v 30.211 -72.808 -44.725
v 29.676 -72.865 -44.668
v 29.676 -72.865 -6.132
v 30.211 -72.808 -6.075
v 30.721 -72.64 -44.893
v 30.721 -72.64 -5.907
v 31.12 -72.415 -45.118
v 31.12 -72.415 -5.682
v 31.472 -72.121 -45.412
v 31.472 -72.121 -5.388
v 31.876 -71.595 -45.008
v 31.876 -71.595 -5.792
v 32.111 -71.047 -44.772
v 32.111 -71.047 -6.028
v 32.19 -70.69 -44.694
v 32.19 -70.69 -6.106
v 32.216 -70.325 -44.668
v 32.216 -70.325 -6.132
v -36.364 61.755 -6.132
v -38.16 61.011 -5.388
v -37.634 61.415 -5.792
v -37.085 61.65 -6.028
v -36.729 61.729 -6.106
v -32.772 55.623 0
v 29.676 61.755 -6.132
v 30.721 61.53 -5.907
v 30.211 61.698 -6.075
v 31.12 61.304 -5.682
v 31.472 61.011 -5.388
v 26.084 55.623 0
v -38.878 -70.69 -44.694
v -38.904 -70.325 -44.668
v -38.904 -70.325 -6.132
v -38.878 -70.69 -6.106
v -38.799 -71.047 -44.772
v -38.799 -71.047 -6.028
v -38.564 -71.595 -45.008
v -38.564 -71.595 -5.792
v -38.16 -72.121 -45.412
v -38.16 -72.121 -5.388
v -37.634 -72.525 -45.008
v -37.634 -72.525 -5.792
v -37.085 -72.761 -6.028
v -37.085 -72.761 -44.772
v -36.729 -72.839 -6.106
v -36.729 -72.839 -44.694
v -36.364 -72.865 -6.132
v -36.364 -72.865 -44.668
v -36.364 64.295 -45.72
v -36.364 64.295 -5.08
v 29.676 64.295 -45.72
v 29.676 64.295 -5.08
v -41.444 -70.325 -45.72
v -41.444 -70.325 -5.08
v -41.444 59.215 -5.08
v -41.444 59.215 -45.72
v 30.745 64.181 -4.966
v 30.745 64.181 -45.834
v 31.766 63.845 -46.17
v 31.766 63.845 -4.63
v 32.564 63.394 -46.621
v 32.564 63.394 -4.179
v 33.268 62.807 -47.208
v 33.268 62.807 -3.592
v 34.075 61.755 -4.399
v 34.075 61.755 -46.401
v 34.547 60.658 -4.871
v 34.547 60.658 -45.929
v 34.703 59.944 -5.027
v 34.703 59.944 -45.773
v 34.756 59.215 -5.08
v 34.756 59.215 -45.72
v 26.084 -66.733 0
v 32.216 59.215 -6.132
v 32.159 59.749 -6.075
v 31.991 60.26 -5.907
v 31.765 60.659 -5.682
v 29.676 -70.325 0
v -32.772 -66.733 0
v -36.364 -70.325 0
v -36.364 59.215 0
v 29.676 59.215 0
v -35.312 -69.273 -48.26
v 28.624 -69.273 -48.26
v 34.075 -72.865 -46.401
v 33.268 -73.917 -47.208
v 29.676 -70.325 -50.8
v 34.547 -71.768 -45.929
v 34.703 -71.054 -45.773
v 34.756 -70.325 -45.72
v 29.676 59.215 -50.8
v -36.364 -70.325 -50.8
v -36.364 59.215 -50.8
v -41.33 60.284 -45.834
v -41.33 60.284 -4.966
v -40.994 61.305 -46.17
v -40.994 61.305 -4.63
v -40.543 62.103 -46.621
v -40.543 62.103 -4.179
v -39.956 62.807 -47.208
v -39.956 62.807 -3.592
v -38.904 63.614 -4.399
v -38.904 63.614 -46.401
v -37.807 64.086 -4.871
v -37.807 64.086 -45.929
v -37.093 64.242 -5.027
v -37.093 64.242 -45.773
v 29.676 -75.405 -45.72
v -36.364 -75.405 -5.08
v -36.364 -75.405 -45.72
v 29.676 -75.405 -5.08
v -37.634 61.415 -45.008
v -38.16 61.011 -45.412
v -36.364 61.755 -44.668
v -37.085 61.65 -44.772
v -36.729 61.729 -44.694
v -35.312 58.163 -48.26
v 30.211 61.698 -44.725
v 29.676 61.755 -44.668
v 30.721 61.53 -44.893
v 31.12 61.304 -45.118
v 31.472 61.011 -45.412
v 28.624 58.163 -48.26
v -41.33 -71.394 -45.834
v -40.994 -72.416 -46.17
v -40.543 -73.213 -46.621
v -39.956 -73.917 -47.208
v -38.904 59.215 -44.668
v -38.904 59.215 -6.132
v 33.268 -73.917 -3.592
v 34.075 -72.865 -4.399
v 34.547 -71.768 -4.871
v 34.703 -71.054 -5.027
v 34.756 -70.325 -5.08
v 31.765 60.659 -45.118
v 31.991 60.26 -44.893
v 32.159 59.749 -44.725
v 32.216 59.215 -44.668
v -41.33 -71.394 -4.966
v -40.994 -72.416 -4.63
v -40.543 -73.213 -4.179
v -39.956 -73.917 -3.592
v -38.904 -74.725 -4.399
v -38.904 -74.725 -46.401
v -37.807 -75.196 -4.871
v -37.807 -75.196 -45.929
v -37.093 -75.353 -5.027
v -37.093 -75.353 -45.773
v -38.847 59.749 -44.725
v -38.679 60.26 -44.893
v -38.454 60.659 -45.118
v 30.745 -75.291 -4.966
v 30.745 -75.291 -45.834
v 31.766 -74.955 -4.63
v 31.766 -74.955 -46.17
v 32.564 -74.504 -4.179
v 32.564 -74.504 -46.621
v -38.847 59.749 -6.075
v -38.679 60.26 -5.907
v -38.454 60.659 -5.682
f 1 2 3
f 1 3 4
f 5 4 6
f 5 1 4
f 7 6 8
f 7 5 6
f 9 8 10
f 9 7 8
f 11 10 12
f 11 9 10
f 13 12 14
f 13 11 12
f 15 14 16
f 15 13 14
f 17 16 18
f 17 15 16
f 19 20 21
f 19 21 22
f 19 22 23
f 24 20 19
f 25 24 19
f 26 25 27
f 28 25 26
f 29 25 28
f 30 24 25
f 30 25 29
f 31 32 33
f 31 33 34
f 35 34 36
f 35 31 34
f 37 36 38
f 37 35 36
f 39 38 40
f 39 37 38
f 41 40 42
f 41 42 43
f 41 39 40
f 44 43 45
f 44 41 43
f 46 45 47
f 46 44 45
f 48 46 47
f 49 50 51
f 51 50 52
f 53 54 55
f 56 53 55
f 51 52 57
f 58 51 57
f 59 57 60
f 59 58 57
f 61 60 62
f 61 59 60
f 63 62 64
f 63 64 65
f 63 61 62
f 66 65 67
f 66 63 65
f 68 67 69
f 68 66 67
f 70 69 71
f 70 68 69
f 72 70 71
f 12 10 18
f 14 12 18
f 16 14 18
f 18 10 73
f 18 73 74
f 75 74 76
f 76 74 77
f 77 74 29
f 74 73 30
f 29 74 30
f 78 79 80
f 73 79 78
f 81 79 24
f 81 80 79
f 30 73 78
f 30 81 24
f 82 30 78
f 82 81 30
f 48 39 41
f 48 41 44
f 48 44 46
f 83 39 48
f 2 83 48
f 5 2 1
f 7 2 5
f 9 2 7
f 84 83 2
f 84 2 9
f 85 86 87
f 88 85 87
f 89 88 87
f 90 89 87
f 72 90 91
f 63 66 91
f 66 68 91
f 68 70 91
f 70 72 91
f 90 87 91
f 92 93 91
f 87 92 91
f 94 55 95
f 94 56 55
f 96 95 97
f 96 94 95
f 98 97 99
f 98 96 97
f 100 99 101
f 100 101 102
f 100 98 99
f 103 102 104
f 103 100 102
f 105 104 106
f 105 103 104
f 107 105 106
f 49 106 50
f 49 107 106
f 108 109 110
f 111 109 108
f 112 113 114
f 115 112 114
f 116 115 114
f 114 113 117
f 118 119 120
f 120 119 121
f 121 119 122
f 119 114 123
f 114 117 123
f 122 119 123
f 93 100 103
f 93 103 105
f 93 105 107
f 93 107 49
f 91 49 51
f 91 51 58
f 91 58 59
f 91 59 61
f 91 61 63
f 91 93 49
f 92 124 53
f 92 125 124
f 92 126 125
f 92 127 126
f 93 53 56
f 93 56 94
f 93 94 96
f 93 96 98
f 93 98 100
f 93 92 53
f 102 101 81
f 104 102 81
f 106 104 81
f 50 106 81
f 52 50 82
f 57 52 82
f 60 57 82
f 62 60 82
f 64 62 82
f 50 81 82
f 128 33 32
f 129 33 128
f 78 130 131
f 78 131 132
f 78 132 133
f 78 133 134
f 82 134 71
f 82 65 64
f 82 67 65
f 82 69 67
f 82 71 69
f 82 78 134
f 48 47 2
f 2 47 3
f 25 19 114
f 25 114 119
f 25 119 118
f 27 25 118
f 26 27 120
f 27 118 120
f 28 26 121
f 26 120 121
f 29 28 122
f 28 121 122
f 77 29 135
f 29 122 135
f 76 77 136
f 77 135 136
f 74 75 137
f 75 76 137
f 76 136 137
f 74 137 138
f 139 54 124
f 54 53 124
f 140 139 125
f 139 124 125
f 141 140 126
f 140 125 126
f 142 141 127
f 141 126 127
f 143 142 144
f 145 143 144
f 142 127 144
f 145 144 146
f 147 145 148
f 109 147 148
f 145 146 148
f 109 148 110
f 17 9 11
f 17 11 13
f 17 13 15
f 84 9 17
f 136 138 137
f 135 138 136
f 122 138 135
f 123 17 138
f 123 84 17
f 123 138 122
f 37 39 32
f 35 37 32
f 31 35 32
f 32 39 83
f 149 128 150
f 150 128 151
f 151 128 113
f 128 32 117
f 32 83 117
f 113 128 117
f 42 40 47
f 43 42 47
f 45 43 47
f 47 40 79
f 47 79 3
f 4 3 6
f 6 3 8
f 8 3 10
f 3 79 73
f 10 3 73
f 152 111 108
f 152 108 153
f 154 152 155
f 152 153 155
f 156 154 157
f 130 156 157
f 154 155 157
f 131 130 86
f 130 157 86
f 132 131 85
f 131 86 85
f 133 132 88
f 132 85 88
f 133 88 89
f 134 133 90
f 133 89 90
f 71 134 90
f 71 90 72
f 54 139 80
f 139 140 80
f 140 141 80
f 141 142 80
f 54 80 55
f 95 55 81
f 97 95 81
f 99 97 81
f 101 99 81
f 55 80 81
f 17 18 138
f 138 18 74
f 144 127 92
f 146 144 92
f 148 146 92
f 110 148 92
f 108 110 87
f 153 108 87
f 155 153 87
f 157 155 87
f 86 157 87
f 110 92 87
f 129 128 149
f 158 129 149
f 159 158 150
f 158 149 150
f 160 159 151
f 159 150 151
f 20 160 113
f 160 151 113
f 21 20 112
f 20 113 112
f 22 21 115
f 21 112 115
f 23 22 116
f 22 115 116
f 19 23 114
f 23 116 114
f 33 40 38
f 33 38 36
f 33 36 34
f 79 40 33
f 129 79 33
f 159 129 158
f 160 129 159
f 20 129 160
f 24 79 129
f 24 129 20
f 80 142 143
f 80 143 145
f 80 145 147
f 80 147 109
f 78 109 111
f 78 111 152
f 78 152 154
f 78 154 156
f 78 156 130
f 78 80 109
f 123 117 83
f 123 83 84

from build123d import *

# Parameters (mm, degrees)
F0_W     = 76.2
F0_H     = 139.7
F1_DEPTH = 50.8
F2_SIZE  = 5.08
F3_R     = 5.08
F4_T     = -2.54


with BuildPart() as f1:
    # F0 (on Top) → F1 (new body)
    with BuildSketch(Plane.XY):
        with Locations((-3.34403, -5.555106)):
            Rectangle(F0_W, F0_H)
    extrude(amount=-F1_DEPTH)

    # F2
    f2_edges = [f1.edges().sort_by_distance(p)[0] for p in [
        (-3.34403, -75.405106, 0),
        (34.75597, -5.555106, 0),
        (-41.44403, -5.555106, 0),
        (-3.34403, 64.294894, 0),
        (34.75597, -5.555106, -50.8),
        (-3.34403, -75.405106, -50.8),
        (-3.34403, 64.294894, -50.8),
        (-41.44403, -5.555106, -50.8),
    ]]
    chamfer(f2_edges, length=F2_SIZE)

    # F3
    f3_edges = [f1.edges().sort_by_distance(p)[0] for p in [
        (34.75597, -75.405106, -25.4),
        (34.75597, 64.294894, -25.4),
        (-41.44403, 64.294894, -25.4),
        (-41.44403, -75.405106, -25.4),
    ]]
    fillet(f3_edges, radius=F3_R)

    # F4
    f4_openings = [f1.faces().sort_by_distance(p)[0] for p in [
        (-3.34403, -5.555106, 0),
    ]]
    offset(amount=F4_T, openings=f4_openings)


solid = f1.part
